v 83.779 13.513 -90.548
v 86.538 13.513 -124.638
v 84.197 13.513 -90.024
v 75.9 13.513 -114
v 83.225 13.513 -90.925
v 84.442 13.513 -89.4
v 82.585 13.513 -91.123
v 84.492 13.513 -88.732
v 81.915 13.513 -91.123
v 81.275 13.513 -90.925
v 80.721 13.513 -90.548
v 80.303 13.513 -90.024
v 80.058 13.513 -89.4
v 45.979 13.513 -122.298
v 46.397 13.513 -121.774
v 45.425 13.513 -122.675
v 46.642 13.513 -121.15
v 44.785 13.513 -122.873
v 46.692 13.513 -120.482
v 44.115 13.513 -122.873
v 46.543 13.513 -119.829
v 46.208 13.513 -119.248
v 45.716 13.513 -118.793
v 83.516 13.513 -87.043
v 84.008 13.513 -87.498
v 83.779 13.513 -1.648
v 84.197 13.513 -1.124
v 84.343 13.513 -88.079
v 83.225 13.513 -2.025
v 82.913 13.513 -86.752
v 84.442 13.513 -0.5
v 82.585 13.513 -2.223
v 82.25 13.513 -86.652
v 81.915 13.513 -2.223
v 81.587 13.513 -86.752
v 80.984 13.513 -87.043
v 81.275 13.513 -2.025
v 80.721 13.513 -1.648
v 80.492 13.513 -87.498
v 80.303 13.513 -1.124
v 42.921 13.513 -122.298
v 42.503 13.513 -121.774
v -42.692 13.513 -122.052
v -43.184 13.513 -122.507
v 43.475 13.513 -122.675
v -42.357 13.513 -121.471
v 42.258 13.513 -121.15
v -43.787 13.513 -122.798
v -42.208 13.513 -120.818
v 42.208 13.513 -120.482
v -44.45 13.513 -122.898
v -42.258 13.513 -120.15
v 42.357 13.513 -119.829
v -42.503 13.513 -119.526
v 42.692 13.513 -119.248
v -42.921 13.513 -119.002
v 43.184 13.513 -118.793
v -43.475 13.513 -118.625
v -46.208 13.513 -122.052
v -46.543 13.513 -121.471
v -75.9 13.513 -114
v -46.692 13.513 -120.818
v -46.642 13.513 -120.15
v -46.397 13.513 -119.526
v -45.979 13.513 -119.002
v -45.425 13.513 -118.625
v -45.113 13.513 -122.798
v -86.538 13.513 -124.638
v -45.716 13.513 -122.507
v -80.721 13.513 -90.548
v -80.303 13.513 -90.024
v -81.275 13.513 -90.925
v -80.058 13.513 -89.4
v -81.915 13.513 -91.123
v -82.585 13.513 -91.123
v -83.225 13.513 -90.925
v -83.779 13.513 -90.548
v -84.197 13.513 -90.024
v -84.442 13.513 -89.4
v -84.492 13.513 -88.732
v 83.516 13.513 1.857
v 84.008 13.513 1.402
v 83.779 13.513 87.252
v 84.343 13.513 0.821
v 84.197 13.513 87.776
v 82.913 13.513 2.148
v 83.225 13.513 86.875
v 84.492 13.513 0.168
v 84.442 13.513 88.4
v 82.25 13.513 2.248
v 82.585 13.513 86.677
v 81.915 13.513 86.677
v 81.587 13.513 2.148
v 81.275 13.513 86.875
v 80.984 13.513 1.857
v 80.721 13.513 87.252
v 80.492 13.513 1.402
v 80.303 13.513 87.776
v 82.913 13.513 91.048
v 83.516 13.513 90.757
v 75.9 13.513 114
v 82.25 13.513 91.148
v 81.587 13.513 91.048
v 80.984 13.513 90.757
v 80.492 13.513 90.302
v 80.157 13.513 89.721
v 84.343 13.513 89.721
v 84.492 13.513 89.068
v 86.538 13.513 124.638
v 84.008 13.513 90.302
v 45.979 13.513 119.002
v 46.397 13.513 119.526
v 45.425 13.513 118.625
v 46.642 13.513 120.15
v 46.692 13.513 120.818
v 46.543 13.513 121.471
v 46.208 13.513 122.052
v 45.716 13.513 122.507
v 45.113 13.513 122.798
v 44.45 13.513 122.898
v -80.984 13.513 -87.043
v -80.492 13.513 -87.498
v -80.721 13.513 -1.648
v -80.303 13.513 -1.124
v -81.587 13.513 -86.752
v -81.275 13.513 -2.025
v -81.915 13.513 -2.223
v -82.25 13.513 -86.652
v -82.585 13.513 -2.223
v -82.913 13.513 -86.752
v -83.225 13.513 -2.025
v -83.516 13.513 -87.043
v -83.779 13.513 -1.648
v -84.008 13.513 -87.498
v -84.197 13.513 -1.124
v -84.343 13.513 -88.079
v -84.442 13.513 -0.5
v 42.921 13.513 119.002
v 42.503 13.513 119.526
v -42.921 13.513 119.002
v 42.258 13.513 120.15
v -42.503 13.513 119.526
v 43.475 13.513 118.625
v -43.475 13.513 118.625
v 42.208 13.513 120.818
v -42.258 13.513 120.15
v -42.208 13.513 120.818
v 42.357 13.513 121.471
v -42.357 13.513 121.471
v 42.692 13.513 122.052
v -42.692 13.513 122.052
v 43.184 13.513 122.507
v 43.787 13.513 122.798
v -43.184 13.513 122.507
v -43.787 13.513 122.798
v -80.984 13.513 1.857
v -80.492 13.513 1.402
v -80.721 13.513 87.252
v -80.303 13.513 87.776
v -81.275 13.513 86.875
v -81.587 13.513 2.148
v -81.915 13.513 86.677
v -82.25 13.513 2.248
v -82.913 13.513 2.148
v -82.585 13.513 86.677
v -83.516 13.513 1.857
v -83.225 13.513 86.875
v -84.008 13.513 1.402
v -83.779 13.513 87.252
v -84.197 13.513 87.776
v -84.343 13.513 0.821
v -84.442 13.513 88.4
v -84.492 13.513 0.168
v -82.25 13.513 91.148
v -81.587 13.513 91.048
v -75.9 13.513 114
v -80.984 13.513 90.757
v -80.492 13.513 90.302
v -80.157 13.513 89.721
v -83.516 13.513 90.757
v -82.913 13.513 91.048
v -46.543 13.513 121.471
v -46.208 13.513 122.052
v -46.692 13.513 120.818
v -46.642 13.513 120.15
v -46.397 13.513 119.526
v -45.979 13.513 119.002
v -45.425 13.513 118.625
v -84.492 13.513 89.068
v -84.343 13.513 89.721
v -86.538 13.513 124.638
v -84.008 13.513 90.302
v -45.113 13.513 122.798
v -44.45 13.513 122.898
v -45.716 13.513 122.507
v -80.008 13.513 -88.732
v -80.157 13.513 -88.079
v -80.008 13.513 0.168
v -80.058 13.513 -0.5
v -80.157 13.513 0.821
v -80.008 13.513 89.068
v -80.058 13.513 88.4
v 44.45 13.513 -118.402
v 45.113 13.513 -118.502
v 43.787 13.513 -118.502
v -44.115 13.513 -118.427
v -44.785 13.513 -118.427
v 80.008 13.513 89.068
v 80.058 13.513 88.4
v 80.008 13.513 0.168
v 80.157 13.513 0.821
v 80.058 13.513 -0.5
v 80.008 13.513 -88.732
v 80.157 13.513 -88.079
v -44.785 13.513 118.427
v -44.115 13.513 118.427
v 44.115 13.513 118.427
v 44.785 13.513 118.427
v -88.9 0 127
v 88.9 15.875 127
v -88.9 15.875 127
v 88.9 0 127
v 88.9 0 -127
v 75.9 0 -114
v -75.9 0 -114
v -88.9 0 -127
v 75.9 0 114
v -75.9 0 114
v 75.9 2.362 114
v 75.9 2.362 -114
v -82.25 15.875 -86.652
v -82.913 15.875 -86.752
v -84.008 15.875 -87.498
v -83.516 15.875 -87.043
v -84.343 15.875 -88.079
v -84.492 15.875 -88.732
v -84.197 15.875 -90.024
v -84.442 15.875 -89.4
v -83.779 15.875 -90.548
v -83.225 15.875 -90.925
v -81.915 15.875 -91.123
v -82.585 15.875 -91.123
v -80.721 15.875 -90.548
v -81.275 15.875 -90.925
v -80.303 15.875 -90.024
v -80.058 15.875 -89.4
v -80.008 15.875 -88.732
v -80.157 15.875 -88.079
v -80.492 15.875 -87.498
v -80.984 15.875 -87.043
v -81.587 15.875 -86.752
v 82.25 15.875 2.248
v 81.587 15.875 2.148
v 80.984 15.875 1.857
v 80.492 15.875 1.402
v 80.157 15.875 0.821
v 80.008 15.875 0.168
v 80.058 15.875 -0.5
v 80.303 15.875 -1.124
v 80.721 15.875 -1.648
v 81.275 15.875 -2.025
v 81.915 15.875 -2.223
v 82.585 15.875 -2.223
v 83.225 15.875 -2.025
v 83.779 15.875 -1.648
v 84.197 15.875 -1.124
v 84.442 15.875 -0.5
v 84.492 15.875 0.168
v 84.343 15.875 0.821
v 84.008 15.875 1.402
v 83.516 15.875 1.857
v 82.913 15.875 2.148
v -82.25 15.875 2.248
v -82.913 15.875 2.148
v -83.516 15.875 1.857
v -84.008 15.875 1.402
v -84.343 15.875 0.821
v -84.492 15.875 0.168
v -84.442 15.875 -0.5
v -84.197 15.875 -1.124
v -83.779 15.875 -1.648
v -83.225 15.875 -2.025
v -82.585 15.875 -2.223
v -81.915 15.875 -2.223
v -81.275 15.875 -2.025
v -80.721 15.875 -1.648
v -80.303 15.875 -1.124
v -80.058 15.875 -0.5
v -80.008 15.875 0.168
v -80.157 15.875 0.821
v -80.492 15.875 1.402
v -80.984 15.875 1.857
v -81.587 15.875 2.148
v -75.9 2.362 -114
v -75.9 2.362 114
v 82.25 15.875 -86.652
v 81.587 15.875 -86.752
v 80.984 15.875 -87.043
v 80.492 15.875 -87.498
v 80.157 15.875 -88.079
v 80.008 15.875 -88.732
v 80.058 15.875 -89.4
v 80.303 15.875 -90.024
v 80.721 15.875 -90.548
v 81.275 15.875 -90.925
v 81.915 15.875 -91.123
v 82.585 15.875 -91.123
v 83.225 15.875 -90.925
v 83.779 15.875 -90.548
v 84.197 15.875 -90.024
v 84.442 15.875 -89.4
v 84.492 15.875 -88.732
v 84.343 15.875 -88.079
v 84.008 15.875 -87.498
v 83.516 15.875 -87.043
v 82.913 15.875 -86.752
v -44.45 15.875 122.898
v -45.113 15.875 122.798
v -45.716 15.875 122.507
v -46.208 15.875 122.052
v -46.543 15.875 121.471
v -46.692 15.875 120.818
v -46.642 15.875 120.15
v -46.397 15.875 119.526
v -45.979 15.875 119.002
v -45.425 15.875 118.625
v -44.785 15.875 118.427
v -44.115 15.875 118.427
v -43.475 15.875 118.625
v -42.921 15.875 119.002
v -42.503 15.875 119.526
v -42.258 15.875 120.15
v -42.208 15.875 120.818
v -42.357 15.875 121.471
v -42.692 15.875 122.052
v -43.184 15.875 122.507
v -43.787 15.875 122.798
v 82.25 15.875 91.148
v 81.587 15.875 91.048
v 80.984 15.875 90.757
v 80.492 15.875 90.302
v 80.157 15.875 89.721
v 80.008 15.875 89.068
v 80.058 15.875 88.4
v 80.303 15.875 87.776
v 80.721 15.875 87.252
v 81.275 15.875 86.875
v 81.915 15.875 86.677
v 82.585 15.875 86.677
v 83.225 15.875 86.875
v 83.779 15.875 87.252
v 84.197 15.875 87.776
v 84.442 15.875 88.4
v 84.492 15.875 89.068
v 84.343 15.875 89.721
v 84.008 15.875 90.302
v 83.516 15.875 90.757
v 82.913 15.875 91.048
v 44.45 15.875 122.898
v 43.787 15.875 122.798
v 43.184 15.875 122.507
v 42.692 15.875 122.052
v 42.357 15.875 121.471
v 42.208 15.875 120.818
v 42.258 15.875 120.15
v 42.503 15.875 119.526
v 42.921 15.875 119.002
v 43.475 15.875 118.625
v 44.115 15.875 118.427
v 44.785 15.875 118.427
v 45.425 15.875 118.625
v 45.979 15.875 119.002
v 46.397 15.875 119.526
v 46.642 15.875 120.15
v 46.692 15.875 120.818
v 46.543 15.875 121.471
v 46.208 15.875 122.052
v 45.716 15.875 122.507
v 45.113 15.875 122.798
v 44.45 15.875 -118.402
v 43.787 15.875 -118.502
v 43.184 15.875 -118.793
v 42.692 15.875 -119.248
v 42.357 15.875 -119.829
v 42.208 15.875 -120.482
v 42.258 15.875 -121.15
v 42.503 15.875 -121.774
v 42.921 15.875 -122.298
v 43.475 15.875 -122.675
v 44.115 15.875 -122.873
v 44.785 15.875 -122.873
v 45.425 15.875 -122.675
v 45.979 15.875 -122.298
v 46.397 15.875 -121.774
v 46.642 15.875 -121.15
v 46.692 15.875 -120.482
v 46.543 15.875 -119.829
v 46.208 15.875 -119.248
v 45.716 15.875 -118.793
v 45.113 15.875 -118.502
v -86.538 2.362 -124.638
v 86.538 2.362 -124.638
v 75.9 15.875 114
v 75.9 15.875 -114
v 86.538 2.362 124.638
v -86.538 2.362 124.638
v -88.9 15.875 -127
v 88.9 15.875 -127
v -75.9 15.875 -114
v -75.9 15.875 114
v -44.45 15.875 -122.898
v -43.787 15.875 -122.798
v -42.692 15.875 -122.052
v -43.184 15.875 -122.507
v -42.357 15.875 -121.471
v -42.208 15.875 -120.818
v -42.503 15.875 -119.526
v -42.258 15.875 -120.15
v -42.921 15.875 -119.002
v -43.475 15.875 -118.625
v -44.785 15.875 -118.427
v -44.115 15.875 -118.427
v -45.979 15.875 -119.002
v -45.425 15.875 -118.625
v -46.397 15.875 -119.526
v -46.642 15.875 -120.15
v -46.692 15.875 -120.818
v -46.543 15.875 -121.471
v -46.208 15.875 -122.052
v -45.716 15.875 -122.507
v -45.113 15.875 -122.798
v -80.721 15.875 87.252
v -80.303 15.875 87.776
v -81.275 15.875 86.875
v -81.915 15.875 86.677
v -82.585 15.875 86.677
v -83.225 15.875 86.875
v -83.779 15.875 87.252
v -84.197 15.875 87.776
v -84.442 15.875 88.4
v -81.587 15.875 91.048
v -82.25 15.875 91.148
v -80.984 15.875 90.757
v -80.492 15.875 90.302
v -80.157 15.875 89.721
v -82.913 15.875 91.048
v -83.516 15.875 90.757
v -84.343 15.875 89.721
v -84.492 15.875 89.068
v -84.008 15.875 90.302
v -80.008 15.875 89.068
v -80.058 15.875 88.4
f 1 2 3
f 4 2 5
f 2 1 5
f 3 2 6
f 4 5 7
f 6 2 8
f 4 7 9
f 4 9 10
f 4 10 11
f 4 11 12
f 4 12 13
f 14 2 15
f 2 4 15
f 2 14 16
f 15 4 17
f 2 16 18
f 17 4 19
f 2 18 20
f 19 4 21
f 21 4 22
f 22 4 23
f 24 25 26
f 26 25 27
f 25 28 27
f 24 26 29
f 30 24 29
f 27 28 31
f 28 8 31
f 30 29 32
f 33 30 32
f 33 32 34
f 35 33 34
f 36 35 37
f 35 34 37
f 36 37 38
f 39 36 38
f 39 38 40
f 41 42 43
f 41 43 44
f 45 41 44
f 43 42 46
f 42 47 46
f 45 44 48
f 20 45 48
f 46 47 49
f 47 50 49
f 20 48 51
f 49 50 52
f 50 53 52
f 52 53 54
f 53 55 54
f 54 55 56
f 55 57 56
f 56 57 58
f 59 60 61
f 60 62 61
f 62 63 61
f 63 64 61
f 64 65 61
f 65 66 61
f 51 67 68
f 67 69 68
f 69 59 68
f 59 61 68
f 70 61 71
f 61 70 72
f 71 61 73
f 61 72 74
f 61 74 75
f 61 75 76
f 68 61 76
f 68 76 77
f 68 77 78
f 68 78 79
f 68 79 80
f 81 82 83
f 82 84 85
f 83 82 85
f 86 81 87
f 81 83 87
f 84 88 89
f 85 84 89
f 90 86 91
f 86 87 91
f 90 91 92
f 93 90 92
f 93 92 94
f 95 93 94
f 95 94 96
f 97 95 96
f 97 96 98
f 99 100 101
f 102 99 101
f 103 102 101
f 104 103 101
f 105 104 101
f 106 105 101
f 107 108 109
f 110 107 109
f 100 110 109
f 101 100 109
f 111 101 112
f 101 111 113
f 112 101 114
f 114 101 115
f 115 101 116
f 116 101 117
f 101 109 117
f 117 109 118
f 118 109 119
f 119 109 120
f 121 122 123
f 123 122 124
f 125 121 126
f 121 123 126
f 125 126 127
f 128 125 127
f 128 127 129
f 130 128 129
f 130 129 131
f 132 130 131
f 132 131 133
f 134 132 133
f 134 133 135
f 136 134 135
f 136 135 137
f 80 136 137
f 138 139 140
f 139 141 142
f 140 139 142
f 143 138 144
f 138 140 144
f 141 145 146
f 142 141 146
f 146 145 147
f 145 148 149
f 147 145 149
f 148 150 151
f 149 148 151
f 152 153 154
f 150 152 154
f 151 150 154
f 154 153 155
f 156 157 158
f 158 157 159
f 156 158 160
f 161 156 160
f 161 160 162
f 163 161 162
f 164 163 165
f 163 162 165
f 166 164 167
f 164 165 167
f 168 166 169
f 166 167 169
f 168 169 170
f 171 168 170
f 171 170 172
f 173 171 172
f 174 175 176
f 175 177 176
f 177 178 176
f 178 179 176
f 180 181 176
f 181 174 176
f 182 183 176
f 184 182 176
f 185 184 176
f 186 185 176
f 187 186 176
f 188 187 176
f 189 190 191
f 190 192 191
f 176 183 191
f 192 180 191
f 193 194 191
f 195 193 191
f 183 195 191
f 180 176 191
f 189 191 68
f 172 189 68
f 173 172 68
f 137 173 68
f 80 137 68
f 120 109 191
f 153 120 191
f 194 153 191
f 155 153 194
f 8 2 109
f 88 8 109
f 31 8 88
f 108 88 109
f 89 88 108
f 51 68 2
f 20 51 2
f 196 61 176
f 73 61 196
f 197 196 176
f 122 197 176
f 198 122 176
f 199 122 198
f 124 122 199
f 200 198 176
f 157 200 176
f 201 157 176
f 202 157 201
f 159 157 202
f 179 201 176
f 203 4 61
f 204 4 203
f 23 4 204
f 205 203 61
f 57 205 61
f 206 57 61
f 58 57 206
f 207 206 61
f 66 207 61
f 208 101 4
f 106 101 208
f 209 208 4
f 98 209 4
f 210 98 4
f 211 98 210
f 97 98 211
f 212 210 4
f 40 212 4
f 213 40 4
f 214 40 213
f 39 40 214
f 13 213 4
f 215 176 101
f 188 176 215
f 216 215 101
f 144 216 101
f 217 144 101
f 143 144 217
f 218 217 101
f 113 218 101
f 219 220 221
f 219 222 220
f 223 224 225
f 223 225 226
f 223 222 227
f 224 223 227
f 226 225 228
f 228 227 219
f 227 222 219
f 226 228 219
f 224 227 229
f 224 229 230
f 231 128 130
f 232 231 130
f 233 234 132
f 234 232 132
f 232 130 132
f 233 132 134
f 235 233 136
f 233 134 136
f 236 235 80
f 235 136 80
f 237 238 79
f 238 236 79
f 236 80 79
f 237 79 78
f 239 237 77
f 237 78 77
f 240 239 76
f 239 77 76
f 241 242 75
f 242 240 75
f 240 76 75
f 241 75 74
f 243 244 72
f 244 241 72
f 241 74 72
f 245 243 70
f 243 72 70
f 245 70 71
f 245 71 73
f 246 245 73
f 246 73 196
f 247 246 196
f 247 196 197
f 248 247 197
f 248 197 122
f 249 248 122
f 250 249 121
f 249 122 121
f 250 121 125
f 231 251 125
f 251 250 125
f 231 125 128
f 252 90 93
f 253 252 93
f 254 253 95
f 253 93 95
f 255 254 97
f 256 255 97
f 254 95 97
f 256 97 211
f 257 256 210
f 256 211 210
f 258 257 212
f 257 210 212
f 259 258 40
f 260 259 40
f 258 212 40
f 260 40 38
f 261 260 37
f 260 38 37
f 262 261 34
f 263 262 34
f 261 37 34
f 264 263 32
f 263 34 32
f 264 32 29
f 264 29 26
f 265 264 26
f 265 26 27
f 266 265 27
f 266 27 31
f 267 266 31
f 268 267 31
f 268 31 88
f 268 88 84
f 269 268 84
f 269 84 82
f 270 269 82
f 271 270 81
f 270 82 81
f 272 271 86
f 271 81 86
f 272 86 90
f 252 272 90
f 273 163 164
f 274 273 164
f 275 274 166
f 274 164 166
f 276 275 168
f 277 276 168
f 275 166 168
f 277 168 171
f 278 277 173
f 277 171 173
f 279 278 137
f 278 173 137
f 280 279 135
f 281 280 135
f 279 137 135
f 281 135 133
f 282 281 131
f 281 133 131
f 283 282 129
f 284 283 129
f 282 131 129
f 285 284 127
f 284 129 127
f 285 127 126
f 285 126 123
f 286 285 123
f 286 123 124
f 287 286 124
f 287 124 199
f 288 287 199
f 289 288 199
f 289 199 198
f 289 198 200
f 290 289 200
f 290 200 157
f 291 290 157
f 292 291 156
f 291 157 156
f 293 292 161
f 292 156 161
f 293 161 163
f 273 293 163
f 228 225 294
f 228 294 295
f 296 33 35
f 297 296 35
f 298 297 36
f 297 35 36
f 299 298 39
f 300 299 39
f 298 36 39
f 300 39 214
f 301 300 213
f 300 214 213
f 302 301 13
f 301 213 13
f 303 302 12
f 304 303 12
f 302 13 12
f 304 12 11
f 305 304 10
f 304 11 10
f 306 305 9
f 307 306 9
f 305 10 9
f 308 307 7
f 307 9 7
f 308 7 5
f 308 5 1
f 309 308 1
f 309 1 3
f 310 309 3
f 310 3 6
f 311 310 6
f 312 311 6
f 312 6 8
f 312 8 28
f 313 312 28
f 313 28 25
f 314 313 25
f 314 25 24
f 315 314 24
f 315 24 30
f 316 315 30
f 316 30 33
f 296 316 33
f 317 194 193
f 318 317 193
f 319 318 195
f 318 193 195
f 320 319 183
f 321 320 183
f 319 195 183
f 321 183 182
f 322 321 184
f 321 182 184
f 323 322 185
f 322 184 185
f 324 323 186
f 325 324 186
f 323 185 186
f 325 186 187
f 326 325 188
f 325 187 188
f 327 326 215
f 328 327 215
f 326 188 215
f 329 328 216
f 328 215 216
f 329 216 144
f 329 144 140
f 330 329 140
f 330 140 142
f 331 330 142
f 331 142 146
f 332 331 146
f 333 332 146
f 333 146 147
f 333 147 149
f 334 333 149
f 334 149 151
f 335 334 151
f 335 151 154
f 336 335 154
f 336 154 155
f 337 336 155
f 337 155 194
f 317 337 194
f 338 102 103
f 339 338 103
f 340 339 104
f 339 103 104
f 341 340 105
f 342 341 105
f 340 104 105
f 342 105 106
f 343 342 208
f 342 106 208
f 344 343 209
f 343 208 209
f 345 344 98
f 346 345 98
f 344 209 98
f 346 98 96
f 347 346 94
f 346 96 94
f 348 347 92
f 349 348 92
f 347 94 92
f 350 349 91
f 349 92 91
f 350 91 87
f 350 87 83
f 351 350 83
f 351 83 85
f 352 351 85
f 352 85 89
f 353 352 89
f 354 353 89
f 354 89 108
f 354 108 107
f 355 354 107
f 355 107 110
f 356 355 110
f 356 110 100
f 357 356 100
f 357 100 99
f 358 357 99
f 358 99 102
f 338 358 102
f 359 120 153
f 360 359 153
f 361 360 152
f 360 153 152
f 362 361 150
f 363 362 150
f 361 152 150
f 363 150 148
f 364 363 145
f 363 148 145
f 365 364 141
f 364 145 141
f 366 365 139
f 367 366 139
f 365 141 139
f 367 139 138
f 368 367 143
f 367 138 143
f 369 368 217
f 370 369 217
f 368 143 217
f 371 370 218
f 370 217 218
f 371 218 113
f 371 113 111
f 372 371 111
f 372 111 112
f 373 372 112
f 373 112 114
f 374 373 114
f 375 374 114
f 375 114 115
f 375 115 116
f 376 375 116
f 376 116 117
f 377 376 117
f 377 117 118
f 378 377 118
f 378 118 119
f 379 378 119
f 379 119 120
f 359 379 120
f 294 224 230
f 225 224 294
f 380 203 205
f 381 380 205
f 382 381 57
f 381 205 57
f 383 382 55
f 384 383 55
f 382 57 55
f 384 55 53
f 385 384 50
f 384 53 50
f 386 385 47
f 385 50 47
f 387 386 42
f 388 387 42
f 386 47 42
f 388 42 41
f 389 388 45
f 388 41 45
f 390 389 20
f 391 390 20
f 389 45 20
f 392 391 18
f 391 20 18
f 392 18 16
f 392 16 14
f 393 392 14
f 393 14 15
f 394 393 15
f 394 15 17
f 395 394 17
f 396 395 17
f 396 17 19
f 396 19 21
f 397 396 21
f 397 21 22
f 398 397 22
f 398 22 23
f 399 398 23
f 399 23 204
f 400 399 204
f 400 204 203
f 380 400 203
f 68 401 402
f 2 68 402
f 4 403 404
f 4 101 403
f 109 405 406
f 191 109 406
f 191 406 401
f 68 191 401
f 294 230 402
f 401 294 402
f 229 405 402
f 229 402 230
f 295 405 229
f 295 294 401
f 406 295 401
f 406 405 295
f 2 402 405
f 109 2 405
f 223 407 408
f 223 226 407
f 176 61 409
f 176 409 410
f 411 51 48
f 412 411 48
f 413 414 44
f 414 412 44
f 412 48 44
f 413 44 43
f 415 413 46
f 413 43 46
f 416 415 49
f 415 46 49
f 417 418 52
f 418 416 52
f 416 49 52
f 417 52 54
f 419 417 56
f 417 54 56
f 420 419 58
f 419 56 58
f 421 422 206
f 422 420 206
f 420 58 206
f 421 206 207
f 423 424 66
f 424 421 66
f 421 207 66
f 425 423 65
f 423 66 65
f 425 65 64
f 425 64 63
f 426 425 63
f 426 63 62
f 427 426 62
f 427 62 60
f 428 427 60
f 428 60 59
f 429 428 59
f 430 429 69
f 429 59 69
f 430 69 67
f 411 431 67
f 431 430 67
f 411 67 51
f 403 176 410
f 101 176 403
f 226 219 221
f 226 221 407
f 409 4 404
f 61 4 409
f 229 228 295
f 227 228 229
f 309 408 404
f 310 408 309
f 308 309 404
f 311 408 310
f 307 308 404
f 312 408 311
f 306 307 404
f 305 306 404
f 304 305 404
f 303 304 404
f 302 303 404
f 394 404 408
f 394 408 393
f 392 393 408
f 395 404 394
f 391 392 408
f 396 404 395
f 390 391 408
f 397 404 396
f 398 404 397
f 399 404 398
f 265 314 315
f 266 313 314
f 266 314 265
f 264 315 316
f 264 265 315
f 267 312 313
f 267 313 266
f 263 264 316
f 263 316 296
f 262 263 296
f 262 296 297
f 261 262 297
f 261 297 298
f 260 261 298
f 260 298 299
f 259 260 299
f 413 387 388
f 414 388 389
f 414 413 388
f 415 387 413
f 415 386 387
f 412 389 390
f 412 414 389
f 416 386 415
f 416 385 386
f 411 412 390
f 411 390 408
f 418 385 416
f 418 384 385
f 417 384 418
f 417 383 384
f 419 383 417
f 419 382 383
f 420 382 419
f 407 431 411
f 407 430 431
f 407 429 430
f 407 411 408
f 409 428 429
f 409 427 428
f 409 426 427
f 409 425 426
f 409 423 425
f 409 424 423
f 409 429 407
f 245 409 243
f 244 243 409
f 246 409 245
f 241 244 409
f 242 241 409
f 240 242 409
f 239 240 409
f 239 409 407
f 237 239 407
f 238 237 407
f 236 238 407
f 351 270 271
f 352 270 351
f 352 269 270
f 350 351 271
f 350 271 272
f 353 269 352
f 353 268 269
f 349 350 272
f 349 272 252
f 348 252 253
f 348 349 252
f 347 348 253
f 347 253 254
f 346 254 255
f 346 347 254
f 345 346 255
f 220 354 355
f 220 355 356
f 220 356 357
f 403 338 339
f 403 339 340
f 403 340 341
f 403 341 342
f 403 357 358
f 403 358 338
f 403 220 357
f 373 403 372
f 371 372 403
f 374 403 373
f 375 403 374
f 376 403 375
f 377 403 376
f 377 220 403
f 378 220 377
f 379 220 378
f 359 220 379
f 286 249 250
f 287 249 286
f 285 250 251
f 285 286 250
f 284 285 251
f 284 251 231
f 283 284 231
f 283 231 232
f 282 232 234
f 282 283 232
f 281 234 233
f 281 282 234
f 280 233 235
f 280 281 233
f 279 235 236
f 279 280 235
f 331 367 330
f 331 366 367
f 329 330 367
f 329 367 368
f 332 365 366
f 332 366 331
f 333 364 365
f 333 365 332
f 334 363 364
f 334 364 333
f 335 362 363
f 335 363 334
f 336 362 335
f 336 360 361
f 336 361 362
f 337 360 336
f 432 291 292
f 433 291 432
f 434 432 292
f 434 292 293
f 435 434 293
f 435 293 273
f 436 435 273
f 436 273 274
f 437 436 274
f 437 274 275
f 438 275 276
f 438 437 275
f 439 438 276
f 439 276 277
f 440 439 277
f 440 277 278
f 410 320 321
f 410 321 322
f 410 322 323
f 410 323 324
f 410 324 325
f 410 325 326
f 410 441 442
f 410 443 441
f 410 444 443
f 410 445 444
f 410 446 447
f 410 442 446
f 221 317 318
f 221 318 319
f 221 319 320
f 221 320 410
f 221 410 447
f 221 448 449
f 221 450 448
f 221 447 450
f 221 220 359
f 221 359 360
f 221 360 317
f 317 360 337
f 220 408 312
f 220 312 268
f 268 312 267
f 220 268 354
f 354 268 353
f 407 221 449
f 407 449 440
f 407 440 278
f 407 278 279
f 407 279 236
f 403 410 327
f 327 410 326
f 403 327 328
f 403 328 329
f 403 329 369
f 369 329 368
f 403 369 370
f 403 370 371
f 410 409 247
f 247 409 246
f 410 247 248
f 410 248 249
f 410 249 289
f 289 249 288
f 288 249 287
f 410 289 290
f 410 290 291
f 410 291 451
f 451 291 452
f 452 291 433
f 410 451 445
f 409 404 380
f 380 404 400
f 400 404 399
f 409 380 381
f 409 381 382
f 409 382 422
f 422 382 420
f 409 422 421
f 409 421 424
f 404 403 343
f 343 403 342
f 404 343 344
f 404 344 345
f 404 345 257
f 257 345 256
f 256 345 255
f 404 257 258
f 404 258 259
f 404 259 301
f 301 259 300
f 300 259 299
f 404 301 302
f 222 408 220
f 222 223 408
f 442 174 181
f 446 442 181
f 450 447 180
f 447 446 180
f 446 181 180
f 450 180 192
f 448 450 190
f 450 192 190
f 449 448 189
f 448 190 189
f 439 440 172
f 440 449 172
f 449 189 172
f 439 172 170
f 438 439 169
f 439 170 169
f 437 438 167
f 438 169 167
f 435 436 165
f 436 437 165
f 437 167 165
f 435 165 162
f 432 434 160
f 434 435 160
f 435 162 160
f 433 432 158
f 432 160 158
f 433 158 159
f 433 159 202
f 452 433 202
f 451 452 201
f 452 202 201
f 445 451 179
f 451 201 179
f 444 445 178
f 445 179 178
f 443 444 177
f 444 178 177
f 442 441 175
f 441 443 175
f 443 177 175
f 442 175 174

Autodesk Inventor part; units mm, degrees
ref_plane "YZ Plane" through (0, 0, 0) normal (1, 0, 0) x (0, 1, 0)
ref_plane "XZ Plane" through (0, 0, 0) normal (0, 1, 0) x (-1, 0, 0)
ref_plane "XY Plane" through (0, 0, 0) normal (0, 0, 1) x (1, 0, 0)
sketch "Sketch1" plane through (0, 0, 0) normal (0, 1, 0) x (-1, 0, 0)
  line L0 (-88.9, 127) -> (88.9, 127)
  line L1 (88.9, 127) -> (88.9, -127)
  line L2 (88.9, -127) -> (-88.9, -127)
  line L3 (-88.9, -127) -> (-88.9, 127)
  line L4 (-88.9, 127) -> (88.9, -127) construction
  line L5 (88.9, 127) -> (-88.9, -127) construction
  line L6 (75.9, 114) -> (-75.9, 114)
  line L7 (-75.9, 114) -> (-75.9, -114)
  line L8 (-75.9, -114) -> (75.9, -114)
  line L9 (75.9, -114) -> (75.9, 114)
  point P0 (0, 0)
  dimension "d1" = 254
  dimension "d2" = 177.8
  dimension "d3" = 13
extrude "Extrusion1" add sketch "Sketch1" along normal blind 15.875
shell "Shell1" thickness 2.3622 removed faces 4 at (-75.9, 5.2917, -38) at (25.3, 5.2917, -114) at (75.9, 5.2917, 38) at (-25.3, 5.2917, 114)
hole "Hole1" at (82.25, 15.875, 0) direction (0, -1, 0) diameter 4.496 end up to surface clearance for "Flat Head Machine Screw (82)" size "#8" standard "Ansi Unified Screw Threads"
pattern_linear "Rectangular Pattern1" count 3 spacing 88.9 along (0, 0, 1) of "Hole1" first direction both ways yes
mirror "Mirror1" about plane through (0, 0, 0) normal (1, 0, 0) of "Hole1", "Rectangular Pattern1"
hole "Hole2" at (44.45, 15.875, 120.65) direction (0, -1, 0) diameter 4.496 end up to surface clearance for "Flat Head Machine Screw (82)" size "#8" standard "Ansi Unified Screw Threads"
mirror "Mirror2" about plane through (0, 0, 0) normal (1, 0, 0) of "Hole2"
mirror "Mirror3" about plane through (0, 0, 0) normal (0, 0, 1) of "Hole2", "Mirror2"
properties part number "honeyCombFrame"
